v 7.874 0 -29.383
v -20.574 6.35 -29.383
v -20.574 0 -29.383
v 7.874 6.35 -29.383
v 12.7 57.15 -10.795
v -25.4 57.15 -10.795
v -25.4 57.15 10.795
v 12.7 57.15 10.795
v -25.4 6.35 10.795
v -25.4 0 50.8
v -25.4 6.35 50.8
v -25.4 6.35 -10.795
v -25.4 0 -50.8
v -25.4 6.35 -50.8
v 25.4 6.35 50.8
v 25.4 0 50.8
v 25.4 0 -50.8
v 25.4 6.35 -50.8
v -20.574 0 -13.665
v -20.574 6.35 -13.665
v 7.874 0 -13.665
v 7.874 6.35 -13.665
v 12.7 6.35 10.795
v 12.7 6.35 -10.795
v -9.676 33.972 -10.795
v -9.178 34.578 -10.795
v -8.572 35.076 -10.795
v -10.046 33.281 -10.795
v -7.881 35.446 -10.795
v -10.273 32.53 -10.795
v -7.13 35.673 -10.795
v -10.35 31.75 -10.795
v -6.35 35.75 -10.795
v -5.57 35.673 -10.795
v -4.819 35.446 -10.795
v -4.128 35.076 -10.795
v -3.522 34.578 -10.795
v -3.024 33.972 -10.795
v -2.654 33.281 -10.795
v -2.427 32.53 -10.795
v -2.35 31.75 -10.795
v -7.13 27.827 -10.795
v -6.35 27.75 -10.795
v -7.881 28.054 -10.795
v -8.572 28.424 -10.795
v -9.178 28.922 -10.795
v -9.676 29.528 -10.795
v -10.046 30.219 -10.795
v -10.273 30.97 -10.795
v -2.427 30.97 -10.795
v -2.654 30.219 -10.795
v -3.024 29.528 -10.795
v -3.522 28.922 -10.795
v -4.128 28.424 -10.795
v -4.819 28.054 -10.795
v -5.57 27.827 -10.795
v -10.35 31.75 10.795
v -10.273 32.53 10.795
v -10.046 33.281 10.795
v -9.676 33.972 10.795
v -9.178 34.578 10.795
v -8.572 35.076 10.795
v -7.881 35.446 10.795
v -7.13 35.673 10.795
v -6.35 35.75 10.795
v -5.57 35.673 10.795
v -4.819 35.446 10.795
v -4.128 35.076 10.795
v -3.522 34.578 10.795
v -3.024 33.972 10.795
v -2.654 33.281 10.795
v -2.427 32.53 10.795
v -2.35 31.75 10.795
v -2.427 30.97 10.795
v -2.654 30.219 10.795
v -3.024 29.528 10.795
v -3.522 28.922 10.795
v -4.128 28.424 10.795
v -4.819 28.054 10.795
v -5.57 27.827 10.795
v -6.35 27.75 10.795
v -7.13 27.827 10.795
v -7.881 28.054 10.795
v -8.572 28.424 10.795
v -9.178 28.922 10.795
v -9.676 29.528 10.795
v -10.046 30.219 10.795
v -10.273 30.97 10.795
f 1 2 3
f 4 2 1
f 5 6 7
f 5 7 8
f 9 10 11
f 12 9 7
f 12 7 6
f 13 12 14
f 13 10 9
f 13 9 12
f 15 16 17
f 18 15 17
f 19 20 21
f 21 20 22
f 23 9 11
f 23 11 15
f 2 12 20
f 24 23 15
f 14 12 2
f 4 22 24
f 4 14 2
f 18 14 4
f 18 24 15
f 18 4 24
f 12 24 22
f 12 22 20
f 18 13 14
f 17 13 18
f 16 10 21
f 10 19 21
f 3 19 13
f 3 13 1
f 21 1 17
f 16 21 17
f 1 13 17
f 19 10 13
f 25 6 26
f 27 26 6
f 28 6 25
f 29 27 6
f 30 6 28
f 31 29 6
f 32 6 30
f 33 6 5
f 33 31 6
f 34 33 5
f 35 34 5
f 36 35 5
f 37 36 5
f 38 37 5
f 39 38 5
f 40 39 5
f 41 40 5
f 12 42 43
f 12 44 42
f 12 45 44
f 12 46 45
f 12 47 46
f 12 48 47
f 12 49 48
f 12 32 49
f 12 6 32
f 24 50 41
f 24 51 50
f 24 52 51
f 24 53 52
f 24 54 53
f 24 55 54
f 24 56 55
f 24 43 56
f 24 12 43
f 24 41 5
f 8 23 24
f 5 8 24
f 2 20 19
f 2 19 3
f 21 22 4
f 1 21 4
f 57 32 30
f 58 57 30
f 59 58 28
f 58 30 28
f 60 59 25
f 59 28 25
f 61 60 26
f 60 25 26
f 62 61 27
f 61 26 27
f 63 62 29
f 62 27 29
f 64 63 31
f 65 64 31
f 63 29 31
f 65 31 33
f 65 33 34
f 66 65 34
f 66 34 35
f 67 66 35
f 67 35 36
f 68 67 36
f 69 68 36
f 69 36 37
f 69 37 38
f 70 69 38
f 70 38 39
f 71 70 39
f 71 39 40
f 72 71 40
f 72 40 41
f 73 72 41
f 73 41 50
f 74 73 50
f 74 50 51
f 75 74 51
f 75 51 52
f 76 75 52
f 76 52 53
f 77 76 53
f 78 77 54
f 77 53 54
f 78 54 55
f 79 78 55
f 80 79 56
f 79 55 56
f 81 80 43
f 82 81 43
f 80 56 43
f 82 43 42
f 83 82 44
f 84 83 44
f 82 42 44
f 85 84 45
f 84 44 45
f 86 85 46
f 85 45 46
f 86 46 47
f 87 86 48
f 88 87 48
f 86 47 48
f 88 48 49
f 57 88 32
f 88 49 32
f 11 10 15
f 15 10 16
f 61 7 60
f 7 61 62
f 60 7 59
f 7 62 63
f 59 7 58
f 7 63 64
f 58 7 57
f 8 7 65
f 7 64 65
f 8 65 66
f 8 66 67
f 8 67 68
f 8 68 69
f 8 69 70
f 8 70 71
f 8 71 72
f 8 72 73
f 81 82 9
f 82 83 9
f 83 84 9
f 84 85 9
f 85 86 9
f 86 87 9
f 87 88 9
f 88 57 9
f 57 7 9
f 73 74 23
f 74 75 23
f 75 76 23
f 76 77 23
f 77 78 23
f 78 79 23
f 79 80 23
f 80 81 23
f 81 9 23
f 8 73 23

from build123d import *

# Parameters (mm, degrees)
SKETCH2_W           = 50.8
SKETCH2_H           = 101.6
BOSS_EXTRUDE1_DEPTH = 6.35
SKETCH4_W           = 38.1
SKETCH4_H           = 21.59
BOSS_EXTRUDE2_DEPTH = 50.8
SKETCH5_R           = 4
CUT_EXTRUDE1_DEPTH  = 88.779419712
SKETCH6_W           = 28.448
SKETCH6_H           = 15.71752
CUT_EXTRUDE2_DEPTH  = 77.2


with BuildPart() as part:
    # Sketch2 → Boss-Extrude1 (new body)
    with BuildSketch(Plane(origin=(0, 0, 0), x_dir=(1, 0, 0), z_dir=(0, 1, 0))):
        Rectangle(SKETCH2_W, SKETCH2_H)
    extrude(amount=BOSS_EXTRUDE1_DEPTH)

    # Sketch4 → Boss-Extrude2 (add)
    with BuildSketch(Plane(origin=(0, 6.35, 0), x_dir=(1, 0, 0), z_dir=(0, 1, 0))):
        with Locations((-6.35, 0)):
            Rectangle(SKETCH4_W, SKETCH4_H)
    extrude(amount=BOSS_EXTRUDE2_DEPTH)

    # Sketch5 → Cut-Extrude1 (cut, through all)
    with BuildSketch(Plane(origin=(0, 0, -10.795), x_dir=(-1, 0, 0), z_dir=(0, 0, -1))):
        with Locations((6.35, 31.75)):
            Circle(SKETCH5_R)
    extrude(amount=-CUT_EXTRUDE1_DEPTH, mode=Mode.SUBTRACT)

    # Sketch6 → Cut-Extrude2 (cut, through all)
    with BuildSketch(Plane(origin=(0, 6.35, 0), x_dir=(1, 0, 0), z_dir=(0, 1, 0))):
        with Locations((-6.35, 21.52396)):
            Rectangle(SKETCH6_W, SKETCH6_H)
    extrude(amount=-CUT_EXTRUDE2_DEPTH, mode=Mode.SUBTRACT)


solid = part.part
